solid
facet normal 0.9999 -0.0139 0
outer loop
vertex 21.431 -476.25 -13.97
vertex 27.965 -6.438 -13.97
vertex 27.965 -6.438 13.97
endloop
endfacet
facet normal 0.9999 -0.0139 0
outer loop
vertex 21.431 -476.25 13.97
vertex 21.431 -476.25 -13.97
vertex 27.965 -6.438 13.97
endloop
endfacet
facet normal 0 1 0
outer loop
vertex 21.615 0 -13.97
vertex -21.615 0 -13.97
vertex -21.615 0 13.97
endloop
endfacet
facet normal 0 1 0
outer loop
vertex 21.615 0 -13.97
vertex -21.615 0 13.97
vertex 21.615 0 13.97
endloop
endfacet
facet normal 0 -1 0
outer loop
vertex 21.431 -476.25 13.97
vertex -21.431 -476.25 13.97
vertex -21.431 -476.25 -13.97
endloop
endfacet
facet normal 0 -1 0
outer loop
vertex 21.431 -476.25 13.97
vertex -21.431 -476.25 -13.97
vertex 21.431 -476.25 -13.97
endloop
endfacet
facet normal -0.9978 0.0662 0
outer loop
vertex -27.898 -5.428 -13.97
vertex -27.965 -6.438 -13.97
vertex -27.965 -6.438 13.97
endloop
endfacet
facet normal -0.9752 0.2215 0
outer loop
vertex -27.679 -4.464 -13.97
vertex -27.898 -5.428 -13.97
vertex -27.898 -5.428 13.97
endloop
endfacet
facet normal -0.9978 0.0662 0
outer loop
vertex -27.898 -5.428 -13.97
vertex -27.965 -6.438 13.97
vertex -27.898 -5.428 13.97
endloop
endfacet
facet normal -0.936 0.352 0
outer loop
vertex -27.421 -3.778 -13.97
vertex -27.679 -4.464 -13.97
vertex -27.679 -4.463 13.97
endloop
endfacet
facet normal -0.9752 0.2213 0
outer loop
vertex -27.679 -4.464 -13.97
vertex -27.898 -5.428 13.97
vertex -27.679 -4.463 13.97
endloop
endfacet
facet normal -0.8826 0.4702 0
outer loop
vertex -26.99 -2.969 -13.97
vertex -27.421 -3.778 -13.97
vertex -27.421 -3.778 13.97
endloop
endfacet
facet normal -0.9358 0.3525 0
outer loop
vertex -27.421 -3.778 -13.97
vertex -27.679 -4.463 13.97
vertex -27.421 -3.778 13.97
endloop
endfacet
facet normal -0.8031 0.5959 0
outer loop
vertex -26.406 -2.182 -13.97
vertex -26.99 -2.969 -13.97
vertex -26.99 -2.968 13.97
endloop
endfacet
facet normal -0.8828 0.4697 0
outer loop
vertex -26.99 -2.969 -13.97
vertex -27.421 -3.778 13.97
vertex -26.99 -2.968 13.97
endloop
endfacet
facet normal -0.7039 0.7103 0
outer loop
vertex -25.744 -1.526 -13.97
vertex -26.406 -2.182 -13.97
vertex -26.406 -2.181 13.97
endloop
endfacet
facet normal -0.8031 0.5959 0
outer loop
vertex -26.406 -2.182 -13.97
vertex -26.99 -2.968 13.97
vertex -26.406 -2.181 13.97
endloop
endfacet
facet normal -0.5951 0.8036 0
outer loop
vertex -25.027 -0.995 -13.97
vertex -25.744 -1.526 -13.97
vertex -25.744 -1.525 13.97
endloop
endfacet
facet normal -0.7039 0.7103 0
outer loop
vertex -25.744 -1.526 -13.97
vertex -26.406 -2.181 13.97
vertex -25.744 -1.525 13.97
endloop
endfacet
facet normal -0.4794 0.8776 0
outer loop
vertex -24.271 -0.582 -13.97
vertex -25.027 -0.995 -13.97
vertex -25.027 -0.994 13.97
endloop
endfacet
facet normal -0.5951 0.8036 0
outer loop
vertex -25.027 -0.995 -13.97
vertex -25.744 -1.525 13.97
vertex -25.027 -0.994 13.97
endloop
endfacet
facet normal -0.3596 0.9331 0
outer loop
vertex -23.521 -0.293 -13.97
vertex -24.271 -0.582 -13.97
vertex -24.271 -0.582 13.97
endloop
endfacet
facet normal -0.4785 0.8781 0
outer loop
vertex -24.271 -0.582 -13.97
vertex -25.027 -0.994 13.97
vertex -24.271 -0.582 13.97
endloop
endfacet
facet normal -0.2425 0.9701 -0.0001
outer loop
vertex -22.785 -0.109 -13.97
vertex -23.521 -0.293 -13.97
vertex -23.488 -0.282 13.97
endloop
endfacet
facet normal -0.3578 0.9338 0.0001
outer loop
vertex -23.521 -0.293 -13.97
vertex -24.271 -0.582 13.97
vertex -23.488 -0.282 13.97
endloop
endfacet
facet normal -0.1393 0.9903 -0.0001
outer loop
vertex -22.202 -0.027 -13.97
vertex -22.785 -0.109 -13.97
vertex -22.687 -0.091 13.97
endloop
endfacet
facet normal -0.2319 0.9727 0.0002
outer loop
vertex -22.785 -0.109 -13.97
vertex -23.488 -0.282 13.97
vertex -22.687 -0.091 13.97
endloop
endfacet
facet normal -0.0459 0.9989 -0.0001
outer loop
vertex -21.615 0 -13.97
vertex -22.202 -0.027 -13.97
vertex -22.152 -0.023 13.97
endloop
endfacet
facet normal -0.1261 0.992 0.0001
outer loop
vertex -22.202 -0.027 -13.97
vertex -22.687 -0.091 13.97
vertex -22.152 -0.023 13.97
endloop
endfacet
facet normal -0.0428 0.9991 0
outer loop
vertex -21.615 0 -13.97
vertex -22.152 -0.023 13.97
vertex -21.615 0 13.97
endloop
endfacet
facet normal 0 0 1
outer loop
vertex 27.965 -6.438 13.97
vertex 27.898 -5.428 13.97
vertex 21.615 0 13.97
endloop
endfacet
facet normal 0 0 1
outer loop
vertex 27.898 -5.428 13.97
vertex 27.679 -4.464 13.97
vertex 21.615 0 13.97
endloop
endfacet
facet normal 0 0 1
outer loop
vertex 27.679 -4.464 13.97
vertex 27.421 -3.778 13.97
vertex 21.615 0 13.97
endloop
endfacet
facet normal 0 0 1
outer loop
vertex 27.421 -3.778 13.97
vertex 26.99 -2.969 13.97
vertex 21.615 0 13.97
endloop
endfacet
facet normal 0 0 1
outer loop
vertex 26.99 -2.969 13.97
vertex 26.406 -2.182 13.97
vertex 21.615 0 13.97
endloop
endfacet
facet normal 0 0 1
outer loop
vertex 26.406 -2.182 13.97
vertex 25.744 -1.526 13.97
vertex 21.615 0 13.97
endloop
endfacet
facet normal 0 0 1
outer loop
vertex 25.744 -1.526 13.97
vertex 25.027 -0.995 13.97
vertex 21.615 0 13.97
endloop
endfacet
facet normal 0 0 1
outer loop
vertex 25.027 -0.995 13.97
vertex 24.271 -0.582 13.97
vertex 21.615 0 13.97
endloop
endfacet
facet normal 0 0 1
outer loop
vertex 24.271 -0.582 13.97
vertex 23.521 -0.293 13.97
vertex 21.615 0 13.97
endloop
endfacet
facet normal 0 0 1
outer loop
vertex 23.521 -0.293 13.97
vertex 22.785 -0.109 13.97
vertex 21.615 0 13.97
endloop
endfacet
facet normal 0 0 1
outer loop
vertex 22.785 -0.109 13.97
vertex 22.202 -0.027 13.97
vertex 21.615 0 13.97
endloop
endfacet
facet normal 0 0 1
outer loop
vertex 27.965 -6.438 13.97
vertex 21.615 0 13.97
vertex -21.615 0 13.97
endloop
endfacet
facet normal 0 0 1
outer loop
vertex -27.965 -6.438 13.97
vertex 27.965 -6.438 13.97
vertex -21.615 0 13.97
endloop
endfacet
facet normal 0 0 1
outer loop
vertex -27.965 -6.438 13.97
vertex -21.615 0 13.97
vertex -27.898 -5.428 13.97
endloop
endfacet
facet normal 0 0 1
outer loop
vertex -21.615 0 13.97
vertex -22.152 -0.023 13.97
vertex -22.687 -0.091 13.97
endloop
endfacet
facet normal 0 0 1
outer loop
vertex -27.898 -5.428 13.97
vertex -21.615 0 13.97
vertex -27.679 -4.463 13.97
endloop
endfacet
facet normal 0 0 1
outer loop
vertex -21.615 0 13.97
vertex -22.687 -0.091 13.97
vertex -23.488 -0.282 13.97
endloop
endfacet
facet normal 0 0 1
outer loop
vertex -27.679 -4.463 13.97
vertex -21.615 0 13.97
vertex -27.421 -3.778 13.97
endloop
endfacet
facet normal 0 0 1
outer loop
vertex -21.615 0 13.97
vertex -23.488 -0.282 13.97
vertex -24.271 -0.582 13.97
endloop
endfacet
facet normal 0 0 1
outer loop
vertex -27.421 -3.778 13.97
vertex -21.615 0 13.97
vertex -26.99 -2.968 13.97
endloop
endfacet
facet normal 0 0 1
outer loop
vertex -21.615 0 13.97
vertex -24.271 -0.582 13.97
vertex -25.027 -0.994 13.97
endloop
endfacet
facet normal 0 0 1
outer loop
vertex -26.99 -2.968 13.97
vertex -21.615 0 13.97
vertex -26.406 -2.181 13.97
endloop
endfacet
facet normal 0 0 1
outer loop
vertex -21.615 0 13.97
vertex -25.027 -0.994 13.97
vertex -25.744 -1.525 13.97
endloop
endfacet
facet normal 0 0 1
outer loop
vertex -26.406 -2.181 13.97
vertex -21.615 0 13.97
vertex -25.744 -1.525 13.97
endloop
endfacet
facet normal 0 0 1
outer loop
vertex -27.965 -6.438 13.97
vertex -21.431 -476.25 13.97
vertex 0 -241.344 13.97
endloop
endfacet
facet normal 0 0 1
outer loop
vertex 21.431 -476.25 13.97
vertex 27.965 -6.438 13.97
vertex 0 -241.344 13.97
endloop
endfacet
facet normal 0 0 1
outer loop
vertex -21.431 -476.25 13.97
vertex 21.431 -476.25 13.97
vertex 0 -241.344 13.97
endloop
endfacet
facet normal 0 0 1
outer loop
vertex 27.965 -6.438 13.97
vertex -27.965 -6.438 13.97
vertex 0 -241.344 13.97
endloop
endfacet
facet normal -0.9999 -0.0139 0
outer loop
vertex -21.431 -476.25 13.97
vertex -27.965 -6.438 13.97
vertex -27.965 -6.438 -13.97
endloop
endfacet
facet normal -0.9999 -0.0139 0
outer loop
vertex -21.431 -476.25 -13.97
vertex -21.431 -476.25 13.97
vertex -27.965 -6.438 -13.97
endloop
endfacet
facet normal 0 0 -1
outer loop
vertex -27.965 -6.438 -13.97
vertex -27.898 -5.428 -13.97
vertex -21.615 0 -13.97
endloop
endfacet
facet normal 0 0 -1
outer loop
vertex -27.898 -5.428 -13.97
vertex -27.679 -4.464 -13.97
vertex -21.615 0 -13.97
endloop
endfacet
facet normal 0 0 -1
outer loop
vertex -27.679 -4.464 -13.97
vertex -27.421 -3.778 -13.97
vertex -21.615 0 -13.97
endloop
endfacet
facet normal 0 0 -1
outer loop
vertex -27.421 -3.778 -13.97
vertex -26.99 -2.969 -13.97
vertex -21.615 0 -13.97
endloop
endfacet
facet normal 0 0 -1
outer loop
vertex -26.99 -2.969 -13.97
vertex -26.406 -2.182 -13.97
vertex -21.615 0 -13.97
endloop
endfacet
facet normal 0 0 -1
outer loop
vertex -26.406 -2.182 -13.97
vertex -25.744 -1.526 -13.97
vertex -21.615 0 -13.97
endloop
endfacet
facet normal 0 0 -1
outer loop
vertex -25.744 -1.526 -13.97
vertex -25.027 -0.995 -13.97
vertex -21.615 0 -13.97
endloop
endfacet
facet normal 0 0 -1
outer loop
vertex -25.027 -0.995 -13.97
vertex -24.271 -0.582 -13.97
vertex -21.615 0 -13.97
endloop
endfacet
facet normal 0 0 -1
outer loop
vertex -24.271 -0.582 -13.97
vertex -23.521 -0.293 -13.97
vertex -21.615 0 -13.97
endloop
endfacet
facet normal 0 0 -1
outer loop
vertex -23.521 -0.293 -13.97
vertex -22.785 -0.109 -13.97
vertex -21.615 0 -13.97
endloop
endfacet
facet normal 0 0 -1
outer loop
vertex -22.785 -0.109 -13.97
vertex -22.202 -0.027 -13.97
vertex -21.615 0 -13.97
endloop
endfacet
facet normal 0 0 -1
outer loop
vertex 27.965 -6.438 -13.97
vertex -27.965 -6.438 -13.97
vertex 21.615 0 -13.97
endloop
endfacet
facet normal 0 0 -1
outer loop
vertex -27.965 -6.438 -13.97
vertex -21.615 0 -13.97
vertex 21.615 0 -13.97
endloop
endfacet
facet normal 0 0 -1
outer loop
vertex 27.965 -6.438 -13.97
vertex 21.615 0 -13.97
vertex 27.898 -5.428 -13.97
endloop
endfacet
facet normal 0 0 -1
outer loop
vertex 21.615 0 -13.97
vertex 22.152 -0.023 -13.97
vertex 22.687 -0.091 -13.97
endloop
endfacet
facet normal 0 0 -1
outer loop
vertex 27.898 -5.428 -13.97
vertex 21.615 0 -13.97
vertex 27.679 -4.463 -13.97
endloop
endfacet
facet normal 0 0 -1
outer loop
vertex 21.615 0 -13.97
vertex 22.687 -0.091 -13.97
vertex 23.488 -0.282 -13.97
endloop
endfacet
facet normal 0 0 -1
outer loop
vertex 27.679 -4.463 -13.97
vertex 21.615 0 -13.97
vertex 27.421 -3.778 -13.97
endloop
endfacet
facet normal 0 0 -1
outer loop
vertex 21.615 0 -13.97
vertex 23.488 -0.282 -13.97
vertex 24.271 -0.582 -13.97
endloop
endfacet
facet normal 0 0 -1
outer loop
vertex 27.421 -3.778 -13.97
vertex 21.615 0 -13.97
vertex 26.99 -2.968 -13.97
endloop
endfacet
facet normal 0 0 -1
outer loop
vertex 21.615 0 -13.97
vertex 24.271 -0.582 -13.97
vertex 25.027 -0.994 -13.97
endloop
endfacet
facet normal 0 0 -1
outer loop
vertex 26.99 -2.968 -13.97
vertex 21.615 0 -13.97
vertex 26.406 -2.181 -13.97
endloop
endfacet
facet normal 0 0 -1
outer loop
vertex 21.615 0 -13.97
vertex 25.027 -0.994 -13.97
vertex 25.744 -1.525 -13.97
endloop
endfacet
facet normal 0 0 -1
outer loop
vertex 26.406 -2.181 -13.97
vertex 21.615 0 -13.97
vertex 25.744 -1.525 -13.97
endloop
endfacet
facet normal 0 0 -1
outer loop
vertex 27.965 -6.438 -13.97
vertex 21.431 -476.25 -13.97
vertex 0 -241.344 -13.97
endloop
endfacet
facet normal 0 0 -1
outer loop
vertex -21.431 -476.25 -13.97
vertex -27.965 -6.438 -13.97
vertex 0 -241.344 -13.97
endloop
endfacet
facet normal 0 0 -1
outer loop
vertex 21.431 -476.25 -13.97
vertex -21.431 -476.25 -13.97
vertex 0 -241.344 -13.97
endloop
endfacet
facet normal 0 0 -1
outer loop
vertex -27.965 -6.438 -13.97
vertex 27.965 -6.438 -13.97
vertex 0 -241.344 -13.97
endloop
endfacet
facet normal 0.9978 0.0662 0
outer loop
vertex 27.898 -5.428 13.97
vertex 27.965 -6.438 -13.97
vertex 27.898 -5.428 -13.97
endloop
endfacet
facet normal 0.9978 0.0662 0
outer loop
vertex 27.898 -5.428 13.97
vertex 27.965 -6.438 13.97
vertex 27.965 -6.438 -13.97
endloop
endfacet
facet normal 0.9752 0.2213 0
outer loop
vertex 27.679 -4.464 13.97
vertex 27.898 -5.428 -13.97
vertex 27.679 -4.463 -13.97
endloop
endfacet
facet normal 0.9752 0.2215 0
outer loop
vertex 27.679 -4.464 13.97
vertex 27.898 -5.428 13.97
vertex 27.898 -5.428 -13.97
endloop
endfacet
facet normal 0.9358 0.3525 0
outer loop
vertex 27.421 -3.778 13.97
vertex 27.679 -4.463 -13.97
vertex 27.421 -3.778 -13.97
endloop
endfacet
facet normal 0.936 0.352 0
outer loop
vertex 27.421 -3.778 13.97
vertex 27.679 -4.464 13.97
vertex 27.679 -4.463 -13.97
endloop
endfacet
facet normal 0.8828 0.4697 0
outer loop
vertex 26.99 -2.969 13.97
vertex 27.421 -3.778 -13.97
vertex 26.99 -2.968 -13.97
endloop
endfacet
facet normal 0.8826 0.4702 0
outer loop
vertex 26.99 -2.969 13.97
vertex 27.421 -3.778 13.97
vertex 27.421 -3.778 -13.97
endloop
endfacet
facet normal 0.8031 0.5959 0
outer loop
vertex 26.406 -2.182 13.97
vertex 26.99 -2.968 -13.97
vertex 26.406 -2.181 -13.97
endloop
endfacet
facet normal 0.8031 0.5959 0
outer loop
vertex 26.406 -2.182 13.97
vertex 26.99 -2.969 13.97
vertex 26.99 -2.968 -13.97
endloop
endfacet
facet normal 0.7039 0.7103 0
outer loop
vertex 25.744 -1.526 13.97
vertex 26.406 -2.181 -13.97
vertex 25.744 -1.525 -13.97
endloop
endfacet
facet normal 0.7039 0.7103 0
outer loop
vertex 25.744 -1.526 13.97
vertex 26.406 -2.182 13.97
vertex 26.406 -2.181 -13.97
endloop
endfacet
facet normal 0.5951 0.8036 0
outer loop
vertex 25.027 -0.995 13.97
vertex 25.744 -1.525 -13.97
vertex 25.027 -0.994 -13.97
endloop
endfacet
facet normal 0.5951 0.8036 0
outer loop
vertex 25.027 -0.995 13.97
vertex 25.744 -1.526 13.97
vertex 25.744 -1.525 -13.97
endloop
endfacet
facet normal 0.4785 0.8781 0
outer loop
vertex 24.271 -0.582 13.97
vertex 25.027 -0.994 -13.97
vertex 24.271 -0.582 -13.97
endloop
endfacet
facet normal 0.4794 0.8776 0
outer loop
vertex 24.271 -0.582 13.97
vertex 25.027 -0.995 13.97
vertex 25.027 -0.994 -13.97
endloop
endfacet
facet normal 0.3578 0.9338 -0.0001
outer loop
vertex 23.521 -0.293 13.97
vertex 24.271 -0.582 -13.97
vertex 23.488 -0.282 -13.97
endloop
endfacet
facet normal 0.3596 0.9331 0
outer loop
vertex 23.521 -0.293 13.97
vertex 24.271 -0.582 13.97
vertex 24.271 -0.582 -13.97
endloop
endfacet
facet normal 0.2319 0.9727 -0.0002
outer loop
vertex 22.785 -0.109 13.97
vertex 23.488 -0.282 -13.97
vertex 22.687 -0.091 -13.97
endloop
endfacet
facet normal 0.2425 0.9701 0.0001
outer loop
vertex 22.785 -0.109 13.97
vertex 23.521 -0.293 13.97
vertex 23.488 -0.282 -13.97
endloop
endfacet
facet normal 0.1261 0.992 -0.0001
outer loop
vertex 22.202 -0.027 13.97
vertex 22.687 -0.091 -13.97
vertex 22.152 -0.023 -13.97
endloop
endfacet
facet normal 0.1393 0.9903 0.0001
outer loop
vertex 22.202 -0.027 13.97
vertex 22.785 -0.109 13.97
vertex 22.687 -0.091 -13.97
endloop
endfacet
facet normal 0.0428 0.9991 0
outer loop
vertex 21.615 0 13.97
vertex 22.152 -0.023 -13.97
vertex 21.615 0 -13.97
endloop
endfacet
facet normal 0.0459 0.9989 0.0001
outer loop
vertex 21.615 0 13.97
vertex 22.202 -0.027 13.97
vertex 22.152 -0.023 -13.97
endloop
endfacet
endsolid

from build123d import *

# Parameters (mm, degrees)
F2_W = 42.8625
F2_H = 27.94
F0_W = 56.1086
F0_H = 27.94
F4_R = 6.35


with BuildPart() as f3:
    # F2 (on offset) → F3 section 0
    with BuildSketch(Plane.XZ.offset(476.25)):
        Rectangle(F2_W, F2_H)
    # F0 (on Front) → F3 section 1
    with BuildSketch(Plane.XZ):
        Rectangle(F0_W, F0_H)
    loft()

    # F4
    f4_edges = [f3.edges().sort_by_distance(p)[0] for p in [
        (-28.0543, 0, 0),
        (28.0543, 0, 0),
    ]]
    fillet(f4_edges, radius=F4_R)


solid = f3.part
